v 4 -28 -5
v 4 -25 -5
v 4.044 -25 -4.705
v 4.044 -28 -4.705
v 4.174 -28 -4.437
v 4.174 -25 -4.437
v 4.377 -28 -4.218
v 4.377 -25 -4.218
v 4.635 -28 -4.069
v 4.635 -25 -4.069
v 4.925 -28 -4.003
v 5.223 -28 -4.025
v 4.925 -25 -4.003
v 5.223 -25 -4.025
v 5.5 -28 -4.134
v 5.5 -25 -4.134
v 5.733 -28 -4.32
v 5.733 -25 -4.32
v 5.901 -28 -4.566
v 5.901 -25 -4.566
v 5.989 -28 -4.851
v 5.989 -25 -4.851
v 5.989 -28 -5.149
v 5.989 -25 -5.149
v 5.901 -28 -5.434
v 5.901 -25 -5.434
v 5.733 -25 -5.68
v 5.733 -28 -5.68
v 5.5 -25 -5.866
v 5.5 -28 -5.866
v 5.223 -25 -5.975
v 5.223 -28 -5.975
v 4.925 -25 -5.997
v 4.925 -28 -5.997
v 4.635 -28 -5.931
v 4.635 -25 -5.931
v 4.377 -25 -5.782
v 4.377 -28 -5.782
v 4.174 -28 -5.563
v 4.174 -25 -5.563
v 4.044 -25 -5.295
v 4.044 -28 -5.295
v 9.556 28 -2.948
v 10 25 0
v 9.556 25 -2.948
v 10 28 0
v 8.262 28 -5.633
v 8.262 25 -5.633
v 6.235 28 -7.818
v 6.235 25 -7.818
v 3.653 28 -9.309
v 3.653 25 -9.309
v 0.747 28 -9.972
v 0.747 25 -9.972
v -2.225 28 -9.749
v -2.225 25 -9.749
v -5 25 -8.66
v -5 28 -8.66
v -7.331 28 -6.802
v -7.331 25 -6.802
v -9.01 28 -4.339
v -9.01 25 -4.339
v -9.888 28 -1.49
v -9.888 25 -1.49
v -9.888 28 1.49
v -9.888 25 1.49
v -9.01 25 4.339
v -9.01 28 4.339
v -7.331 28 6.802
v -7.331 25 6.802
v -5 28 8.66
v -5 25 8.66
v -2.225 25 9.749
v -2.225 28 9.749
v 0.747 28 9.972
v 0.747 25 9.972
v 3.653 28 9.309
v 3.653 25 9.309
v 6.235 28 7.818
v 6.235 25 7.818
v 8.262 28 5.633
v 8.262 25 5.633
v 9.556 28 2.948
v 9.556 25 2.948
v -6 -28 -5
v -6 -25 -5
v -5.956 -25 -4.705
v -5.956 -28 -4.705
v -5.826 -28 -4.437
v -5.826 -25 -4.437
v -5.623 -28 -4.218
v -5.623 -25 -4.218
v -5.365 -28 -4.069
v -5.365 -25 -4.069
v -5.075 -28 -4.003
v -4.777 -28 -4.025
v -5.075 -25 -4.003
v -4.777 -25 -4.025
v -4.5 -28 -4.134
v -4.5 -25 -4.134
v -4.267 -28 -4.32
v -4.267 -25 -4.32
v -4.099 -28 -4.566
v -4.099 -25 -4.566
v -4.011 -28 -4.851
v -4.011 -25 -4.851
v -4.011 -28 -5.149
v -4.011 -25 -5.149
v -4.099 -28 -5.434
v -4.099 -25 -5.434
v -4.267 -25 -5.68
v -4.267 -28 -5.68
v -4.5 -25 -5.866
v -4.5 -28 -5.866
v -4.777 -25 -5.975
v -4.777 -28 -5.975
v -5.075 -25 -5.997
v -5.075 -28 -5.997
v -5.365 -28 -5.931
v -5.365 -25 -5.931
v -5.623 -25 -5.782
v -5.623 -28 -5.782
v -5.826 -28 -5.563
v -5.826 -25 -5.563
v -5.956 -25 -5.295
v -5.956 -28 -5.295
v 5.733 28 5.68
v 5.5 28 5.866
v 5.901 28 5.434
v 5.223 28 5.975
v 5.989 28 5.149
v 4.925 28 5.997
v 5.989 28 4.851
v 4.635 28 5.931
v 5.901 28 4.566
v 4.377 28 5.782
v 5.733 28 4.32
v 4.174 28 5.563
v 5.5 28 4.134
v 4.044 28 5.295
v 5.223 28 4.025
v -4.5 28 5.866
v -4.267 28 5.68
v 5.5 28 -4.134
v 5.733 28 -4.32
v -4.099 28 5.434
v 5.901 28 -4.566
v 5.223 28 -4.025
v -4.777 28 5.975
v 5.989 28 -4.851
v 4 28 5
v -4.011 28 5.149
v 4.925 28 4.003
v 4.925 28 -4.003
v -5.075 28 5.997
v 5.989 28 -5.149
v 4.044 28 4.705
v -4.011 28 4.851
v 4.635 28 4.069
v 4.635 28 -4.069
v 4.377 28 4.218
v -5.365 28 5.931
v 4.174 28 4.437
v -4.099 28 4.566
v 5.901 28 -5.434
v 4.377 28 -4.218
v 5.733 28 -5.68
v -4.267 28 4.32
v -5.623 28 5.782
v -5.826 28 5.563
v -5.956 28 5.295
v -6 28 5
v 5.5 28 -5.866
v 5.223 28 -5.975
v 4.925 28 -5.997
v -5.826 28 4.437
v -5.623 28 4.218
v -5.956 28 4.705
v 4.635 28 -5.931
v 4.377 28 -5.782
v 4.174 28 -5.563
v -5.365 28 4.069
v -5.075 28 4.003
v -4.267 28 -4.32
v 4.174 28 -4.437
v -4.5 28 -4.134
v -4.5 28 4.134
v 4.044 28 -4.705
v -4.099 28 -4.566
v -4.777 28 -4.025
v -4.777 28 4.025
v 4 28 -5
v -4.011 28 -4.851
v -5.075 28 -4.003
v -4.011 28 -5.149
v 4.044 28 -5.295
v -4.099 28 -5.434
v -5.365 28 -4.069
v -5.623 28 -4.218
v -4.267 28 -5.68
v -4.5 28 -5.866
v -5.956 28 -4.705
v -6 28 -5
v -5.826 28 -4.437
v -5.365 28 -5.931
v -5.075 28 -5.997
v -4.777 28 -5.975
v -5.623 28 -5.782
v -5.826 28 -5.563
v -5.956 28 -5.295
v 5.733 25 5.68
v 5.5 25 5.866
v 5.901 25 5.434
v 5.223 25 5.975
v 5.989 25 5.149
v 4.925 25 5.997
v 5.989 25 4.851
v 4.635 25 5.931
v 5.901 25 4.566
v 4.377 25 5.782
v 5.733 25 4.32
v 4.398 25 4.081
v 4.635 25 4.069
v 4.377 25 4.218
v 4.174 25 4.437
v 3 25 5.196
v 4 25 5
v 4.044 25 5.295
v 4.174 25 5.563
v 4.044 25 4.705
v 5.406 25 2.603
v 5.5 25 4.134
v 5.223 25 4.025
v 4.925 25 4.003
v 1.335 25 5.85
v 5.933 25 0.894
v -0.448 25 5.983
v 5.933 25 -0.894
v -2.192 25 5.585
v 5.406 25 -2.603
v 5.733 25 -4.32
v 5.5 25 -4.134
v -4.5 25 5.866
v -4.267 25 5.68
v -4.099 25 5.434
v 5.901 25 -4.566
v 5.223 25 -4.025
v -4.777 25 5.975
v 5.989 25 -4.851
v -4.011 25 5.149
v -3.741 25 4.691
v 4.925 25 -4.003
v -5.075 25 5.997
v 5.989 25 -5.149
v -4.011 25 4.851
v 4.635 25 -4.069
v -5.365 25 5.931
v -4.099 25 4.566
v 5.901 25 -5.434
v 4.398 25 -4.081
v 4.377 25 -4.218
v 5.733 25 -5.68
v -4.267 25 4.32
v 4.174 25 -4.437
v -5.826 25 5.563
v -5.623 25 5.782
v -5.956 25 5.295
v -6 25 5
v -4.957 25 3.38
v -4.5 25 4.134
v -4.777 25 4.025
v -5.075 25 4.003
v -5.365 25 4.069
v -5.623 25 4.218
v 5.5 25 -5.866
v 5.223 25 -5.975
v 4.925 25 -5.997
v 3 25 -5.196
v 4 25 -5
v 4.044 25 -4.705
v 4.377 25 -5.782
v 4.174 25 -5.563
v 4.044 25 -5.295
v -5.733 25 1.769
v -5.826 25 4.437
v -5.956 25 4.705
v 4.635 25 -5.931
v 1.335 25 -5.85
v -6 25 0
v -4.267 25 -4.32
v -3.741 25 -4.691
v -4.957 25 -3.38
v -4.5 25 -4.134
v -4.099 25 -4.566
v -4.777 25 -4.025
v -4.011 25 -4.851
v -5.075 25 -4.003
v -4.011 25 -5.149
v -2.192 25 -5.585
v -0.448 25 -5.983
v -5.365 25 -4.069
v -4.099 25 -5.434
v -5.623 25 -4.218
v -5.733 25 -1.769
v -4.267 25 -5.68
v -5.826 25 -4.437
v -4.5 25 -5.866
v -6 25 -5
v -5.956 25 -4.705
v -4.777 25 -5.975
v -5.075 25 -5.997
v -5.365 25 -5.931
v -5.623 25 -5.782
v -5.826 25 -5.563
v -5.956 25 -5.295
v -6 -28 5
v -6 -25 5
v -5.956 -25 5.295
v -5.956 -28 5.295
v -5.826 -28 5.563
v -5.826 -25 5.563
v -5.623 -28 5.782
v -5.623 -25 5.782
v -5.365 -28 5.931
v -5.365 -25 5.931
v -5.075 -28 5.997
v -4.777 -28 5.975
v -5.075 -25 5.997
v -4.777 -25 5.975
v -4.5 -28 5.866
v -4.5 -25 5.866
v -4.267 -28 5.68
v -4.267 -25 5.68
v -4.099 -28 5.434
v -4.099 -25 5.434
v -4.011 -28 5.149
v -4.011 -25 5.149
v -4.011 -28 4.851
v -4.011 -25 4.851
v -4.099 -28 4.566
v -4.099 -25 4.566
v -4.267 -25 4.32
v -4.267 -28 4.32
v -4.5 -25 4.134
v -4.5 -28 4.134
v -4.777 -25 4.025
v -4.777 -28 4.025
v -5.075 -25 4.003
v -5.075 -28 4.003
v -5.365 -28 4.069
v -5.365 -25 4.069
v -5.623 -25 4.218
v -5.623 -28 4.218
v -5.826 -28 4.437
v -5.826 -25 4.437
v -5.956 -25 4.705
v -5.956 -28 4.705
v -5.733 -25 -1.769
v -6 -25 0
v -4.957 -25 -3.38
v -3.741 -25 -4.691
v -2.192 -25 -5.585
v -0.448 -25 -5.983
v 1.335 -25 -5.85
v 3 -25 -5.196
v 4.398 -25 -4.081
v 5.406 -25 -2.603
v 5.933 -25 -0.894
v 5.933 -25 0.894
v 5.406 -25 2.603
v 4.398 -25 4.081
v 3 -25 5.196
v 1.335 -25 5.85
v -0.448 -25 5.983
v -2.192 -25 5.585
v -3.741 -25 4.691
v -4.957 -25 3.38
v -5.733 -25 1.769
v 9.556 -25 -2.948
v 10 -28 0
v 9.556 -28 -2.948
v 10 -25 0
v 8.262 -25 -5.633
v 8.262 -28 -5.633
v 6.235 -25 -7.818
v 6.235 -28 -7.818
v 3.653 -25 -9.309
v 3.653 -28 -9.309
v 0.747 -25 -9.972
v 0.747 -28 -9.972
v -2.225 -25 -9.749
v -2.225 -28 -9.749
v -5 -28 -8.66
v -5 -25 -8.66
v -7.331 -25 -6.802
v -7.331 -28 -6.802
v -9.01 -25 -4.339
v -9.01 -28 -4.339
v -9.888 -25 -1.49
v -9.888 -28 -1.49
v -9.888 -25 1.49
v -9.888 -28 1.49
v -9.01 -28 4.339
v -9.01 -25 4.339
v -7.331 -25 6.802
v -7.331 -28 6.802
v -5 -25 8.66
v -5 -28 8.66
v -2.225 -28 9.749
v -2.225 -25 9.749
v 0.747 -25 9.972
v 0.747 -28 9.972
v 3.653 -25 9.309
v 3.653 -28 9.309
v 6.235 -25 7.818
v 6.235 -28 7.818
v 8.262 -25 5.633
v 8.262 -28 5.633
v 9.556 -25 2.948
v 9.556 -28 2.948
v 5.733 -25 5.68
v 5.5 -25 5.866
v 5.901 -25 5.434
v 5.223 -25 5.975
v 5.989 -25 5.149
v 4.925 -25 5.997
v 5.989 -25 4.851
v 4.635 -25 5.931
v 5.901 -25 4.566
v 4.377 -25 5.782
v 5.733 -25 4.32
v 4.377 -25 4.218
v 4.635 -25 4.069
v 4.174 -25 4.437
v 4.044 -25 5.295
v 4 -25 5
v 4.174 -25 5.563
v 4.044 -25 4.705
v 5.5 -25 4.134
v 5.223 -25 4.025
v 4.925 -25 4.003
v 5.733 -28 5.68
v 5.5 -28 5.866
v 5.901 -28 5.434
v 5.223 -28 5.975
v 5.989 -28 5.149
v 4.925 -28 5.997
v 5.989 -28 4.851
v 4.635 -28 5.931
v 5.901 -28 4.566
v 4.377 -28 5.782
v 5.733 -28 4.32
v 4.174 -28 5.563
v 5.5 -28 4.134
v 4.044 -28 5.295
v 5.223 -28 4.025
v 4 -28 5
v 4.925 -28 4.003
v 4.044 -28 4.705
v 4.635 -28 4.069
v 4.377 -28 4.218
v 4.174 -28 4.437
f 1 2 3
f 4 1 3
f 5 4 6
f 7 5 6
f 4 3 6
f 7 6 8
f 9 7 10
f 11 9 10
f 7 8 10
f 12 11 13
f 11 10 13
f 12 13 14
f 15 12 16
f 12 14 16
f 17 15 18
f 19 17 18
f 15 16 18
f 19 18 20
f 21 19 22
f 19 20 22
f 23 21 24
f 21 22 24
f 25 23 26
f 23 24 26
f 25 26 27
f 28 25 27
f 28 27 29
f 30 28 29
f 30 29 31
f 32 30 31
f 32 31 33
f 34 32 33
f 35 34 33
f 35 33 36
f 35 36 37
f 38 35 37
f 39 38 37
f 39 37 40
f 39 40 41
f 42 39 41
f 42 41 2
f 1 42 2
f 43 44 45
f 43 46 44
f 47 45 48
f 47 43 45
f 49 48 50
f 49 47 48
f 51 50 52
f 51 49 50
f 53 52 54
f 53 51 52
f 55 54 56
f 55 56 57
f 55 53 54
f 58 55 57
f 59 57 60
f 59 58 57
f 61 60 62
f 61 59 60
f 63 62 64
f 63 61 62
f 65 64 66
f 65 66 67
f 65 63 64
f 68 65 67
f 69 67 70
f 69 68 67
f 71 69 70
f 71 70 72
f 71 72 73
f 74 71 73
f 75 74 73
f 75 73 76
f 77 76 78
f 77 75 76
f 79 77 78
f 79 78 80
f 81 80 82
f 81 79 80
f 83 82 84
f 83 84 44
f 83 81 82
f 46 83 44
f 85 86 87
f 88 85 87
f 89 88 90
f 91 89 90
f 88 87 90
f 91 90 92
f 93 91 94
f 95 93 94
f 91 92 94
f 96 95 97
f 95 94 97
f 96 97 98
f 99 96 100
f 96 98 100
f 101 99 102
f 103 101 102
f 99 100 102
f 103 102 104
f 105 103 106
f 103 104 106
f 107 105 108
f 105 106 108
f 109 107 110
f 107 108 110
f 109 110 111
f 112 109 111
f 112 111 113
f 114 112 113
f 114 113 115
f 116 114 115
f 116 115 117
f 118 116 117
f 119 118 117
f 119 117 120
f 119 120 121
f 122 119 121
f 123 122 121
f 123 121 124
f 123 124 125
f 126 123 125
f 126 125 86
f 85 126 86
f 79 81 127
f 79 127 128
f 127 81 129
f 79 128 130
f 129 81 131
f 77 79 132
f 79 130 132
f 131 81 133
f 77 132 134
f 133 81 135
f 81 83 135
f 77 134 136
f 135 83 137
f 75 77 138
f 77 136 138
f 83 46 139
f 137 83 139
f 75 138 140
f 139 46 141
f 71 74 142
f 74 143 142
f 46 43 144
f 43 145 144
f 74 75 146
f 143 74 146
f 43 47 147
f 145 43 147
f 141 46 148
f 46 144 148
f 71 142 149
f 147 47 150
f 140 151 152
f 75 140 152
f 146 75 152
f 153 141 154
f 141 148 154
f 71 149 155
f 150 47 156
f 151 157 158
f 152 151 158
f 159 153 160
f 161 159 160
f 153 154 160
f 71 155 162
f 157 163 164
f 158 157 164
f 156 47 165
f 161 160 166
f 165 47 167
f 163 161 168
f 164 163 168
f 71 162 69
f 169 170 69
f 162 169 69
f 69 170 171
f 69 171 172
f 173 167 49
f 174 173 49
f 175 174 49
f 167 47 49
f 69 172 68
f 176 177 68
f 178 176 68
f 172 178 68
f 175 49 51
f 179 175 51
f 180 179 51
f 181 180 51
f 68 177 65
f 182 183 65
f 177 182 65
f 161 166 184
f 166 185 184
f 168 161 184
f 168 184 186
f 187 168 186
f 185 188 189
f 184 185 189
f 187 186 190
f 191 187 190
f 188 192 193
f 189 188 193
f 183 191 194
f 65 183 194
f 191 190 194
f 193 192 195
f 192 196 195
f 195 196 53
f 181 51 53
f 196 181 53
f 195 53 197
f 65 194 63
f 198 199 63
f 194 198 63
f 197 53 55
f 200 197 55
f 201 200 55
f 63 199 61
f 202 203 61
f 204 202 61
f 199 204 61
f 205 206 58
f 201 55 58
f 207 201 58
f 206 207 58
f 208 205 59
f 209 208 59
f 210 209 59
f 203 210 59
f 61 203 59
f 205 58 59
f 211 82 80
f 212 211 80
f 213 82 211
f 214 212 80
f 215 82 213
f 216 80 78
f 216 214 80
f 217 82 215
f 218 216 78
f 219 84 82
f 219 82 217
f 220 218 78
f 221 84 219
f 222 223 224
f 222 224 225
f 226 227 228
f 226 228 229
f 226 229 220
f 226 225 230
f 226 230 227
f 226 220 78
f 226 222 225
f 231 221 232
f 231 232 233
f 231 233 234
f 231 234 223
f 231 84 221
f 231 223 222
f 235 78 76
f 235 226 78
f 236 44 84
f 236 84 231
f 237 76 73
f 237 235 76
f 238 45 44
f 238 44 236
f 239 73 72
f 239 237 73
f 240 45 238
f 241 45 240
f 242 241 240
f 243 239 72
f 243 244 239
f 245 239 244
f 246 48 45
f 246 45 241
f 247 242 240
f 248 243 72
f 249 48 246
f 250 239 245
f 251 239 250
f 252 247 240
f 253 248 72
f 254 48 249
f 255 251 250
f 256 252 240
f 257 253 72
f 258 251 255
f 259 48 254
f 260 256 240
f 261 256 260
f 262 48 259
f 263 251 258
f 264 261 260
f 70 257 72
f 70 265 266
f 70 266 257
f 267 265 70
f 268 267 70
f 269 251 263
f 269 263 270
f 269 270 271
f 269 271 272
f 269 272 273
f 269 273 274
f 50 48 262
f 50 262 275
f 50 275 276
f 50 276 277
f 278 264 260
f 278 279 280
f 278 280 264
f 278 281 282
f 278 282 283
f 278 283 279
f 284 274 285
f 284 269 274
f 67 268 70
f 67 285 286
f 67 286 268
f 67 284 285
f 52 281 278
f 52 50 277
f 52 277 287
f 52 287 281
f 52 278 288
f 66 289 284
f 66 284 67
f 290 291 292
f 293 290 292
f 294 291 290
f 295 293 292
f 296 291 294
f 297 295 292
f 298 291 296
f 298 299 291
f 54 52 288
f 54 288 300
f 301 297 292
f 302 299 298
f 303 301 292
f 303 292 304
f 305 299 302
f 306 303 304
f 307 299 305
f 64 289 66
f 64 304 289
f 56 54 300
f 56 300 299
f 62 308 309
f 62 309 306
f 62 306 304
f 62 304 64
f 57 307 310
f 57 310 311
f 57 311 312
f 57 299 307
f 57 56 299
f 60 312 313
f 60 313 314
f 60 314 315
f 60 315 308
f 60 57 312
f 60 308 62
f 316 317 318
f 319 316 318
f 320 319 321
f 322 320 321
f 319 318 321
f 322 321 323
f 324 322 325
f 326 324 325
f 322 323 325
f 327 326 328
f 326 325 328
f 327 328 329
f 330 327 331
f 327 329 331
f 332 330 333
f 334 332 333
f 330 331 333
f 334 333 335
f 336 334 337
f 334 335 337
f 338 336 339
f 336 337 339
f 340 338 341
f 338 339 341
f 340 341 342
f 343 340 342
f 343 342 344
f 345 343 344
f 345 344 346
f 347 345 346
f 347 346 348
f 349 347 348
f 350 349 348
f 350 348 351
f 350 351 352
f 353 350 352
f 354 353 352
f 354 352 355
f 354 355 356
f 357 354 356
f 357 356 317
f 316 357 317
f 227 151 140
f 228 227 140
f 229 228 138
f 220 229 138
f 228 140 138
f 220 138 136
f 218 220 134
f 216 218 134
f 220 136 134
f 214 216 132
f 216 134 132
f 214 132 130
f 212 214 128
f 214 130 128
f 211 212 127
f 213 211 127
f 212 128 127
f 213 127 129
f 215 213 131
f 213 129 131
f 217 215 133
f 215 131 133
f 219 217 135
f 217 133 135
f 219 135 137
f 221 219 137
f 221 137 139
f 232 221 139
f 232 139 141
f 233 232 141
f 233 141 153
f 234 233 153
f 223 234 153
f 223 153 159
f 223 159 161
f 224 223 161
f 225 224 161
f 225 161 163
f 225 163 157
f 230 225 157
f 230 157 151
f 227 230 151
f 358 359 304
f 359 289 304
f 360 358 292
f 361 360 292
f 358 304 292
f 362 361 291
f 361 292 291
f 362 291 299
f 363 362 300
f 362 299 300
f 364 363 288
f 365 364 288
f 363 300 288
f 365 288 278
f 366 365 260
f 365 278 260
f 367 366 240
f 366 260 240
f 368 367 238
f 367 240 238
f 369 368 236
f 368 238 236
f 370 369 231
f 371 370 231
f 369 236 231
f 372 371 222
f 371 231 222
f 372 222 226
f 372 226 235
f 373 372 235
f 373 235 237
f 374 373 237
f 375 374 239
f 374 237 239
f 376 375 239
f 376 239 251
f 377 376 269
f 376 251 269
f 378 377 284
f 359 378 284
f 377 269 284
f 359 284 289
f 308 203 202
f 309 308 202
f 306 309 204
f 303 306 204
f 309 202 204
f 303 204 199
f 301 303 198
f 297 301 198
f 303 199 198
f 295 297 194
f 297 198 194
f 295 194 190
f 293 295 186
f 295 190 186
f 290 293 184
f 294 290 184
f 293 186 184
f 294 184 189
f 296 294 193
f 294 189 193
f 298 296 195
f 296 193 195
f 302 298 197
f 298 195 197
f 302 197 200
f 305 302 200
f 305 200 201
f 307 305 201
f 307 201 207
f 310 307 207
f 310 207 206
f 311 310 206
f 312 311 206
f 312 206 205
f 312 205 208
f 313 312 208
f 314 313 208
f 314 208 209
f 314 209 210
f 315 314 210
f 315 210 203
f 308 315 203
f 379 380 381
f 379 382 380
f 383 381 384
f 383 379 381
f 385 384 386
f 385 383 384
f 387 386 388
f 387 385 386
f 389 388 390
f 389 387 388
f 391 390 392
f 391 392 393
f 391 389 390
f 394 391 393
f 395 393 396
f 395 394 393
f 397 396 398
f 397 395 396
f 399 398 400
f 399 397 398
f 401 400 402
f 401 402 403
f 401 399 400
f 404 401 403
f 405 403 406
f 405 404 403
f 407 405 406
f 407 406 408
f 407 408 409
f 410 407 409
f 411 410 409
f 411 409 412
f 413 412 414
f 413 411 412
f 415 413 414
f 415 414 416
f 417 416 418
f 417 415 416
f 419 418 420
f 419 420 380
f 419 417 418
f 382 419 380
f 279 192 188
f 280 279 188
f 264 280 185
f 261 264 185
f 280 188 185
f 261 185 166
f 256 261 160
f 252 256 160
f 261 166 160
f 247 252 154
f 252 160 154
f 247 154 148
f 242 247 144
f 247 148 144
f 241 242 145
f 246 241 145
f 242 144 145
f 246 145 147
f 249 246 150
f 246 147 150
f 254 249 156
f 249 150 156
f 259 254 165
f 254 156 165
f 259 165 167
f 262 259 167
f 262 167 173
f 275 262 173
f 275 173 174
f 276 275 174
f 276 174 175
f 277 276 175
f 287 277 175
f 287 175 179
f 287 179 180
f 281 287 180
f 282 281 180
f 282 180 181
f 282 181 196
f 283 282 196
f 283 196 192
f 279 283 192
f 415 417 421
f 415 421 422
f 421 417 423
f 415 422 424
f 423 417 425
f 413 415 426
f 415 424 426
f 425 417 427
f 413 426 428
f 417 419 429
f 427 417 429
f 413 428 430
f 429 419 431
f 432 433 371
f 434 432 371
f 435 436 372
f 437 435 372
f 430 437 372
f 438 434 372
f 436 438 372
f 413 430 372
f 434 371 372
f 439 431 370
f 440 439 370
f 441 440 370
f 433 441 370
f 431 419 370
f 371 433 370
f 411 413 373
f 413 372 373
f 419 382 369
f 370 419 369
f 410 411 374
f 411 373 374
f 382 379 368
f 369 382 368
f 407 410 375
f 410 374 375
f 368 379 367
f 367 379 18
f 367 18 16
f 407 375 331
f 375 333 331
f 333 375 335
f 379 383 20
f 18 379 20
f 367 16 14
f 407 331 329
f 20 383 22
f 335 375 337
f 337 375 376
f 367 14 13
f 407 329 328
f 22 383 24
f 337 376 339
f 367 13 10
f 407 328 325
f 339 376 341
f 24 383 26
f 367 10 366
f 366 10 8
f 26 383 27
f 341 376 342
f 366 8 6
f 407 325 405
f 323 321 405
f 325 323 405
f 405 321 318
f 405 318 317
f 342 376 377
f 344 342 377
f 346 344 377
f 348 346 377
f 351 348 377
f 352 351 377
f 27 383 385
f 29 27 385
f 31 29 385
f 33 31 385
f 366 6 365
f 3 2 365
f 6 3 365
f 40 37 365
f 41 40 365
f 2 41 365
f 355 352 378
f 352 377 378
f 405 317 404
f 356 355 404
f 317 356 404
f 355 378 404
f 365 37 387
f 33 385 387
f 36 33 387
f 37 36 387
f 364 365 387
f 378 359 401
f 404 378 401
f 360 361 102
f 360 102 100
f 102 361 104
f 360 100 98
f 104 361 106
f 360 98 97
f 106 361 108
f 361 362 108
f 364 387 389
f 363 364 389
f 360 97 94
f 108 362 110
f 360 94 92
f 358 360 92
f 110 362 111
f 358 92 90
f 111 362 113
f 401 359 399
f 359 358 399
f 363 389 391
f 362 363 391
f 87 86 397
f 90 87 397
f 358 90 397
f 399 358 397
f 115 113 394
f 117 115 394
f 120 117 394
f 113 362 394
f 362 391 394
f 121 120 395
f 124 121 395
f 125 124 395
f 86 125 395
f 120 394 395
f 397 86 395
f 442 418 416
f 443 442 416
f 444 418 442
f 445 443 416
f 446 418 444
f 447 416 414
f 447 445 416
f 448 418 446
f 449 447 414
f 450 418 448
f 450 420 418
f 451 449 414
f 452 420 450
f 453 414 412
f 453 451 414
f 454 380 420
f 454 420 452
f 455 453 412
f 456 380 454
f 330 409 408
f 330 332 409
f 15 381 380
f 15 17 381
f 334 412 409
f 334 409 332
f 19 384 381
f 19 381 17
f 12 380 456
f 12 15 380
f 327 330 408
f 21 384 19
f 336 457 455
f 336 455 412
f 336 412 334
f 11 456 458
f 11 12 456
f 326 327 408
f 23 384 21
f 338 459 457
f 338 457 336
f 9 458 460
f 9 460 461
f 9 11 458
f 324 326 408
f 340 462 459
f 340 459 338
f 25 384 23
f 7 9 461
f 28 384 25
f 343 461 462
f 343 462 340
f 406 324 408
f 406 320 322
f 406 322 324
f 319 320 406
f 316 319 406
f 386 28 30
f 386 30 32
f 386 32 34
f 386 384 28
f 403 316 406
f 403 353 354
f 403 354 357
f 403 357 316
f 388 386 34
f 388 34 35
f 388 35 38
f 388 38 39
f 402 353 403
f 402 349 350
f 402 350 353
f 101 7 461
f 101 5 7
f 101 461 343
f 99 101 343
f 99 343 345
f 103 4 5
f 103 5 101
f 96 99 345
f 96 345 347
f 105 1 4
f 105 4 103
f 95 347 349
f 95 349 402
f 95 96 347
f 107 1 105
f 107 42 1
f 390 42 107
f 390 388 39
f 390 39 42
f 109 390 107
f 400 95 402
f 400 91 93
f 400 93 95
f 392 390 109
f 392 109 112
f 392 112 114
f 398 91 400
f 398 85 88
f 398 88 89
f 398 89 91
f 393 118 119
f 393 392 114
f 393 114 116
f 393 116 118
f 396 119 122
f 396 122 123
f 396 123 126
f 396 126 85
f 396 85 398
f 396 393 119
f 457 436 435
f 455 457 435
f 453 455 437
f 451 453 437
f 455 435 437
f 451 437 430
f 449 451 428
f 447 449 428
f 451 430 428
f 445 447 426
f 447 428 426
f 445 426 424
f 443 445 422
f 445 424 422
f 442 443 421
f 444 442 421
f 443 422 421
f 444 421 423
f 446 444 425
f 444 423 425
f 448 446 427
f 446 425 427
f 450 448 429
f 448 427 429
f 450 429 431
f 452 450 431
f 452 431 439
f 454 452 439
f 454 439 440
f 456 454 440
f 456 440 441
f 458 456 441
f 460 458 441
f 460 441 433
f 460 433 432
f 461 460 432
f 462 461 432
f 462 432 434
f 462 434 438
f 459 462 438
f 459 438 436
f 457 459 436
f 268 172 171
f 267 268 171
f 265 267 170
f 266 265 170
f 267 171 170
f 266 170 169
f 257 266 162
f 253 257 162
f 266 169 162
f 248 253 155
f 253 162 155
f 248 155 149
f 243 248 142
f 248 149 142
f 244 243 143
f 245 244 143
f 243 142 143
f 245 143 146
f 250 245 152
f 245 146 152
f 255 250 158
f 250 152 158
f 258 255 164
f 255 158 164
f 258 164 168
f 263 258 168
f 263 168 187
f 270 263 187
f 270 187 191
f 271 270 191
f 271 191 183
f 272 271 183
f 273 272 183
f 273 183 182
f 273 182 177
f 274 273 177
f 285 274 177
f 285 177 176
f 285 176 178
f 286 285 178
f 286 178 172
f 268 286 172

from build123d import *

# Parameters (mm, degrees)
SKETCH_1_W          = 6
SKETCH_1_H          = 50
SKETCH_2_W          = 10
SKETCH_2_H          = 3
SKETCH_3_R          = 1
CUT_EXTRUDE_1_DEPTH = 5000


with BuildPart() as part:
    # 草图1 → 旋转1 (revolve)
    with BuildSketch(Plane.XY, mode=Mode.PRIVATE) as revolve_1_sk:
        with Locations((3, 0)):
            Rectangle(SKETCH_1_W, SKETCH_1_H)
    revolve(revolve_1_sk.sketch.rotate(Axis((0, 25, 0), (0, -1, 0)), 180), axis=Axis((0, 25, 0), (0, -1, 0)))

    # 草图2 → 旋转2 (revolve)
    with BuildSketch(Plane.XY):
        with Locations((5, 26.5)):
            Rectangle(SKETCH_2_W, SKETCH_2_H)
        with Locations((5, -26.5)):
            Rectangle(SKETCH_2_W, SKETCH_2_H)
    revolve(axis=Axis((0, 25, 0), (0, 1, 0)))

    # 草图3 → 切除-拉伸1 (cut)
    with BuildSketch(Plane(origin=(0, 28, 0), x_dir=(1, 0, 0), z_dir=(0, 1, 0))):
        with Locations(Location((-5, 5, 0), (0, 0, 180))):
            Circle(SKETCH_3_R)
        with Locations(Location((5, 5, 0), (0, 0, 180))):
            Circle(SKETCH_3_R)
        with Locations(Location((-5, -5, 0), (0, 0, 180))):
            Circle(SKETCH_3_R)
        with Locations(Location((5, -5, 0), (0, 0, 180))):
            Circle(SKETCH_3_R)
    extrude(amount=-CUT_EXTRUDE_1_DEPTH, mode=Mode.SUBTRACT)


solid = part.part
